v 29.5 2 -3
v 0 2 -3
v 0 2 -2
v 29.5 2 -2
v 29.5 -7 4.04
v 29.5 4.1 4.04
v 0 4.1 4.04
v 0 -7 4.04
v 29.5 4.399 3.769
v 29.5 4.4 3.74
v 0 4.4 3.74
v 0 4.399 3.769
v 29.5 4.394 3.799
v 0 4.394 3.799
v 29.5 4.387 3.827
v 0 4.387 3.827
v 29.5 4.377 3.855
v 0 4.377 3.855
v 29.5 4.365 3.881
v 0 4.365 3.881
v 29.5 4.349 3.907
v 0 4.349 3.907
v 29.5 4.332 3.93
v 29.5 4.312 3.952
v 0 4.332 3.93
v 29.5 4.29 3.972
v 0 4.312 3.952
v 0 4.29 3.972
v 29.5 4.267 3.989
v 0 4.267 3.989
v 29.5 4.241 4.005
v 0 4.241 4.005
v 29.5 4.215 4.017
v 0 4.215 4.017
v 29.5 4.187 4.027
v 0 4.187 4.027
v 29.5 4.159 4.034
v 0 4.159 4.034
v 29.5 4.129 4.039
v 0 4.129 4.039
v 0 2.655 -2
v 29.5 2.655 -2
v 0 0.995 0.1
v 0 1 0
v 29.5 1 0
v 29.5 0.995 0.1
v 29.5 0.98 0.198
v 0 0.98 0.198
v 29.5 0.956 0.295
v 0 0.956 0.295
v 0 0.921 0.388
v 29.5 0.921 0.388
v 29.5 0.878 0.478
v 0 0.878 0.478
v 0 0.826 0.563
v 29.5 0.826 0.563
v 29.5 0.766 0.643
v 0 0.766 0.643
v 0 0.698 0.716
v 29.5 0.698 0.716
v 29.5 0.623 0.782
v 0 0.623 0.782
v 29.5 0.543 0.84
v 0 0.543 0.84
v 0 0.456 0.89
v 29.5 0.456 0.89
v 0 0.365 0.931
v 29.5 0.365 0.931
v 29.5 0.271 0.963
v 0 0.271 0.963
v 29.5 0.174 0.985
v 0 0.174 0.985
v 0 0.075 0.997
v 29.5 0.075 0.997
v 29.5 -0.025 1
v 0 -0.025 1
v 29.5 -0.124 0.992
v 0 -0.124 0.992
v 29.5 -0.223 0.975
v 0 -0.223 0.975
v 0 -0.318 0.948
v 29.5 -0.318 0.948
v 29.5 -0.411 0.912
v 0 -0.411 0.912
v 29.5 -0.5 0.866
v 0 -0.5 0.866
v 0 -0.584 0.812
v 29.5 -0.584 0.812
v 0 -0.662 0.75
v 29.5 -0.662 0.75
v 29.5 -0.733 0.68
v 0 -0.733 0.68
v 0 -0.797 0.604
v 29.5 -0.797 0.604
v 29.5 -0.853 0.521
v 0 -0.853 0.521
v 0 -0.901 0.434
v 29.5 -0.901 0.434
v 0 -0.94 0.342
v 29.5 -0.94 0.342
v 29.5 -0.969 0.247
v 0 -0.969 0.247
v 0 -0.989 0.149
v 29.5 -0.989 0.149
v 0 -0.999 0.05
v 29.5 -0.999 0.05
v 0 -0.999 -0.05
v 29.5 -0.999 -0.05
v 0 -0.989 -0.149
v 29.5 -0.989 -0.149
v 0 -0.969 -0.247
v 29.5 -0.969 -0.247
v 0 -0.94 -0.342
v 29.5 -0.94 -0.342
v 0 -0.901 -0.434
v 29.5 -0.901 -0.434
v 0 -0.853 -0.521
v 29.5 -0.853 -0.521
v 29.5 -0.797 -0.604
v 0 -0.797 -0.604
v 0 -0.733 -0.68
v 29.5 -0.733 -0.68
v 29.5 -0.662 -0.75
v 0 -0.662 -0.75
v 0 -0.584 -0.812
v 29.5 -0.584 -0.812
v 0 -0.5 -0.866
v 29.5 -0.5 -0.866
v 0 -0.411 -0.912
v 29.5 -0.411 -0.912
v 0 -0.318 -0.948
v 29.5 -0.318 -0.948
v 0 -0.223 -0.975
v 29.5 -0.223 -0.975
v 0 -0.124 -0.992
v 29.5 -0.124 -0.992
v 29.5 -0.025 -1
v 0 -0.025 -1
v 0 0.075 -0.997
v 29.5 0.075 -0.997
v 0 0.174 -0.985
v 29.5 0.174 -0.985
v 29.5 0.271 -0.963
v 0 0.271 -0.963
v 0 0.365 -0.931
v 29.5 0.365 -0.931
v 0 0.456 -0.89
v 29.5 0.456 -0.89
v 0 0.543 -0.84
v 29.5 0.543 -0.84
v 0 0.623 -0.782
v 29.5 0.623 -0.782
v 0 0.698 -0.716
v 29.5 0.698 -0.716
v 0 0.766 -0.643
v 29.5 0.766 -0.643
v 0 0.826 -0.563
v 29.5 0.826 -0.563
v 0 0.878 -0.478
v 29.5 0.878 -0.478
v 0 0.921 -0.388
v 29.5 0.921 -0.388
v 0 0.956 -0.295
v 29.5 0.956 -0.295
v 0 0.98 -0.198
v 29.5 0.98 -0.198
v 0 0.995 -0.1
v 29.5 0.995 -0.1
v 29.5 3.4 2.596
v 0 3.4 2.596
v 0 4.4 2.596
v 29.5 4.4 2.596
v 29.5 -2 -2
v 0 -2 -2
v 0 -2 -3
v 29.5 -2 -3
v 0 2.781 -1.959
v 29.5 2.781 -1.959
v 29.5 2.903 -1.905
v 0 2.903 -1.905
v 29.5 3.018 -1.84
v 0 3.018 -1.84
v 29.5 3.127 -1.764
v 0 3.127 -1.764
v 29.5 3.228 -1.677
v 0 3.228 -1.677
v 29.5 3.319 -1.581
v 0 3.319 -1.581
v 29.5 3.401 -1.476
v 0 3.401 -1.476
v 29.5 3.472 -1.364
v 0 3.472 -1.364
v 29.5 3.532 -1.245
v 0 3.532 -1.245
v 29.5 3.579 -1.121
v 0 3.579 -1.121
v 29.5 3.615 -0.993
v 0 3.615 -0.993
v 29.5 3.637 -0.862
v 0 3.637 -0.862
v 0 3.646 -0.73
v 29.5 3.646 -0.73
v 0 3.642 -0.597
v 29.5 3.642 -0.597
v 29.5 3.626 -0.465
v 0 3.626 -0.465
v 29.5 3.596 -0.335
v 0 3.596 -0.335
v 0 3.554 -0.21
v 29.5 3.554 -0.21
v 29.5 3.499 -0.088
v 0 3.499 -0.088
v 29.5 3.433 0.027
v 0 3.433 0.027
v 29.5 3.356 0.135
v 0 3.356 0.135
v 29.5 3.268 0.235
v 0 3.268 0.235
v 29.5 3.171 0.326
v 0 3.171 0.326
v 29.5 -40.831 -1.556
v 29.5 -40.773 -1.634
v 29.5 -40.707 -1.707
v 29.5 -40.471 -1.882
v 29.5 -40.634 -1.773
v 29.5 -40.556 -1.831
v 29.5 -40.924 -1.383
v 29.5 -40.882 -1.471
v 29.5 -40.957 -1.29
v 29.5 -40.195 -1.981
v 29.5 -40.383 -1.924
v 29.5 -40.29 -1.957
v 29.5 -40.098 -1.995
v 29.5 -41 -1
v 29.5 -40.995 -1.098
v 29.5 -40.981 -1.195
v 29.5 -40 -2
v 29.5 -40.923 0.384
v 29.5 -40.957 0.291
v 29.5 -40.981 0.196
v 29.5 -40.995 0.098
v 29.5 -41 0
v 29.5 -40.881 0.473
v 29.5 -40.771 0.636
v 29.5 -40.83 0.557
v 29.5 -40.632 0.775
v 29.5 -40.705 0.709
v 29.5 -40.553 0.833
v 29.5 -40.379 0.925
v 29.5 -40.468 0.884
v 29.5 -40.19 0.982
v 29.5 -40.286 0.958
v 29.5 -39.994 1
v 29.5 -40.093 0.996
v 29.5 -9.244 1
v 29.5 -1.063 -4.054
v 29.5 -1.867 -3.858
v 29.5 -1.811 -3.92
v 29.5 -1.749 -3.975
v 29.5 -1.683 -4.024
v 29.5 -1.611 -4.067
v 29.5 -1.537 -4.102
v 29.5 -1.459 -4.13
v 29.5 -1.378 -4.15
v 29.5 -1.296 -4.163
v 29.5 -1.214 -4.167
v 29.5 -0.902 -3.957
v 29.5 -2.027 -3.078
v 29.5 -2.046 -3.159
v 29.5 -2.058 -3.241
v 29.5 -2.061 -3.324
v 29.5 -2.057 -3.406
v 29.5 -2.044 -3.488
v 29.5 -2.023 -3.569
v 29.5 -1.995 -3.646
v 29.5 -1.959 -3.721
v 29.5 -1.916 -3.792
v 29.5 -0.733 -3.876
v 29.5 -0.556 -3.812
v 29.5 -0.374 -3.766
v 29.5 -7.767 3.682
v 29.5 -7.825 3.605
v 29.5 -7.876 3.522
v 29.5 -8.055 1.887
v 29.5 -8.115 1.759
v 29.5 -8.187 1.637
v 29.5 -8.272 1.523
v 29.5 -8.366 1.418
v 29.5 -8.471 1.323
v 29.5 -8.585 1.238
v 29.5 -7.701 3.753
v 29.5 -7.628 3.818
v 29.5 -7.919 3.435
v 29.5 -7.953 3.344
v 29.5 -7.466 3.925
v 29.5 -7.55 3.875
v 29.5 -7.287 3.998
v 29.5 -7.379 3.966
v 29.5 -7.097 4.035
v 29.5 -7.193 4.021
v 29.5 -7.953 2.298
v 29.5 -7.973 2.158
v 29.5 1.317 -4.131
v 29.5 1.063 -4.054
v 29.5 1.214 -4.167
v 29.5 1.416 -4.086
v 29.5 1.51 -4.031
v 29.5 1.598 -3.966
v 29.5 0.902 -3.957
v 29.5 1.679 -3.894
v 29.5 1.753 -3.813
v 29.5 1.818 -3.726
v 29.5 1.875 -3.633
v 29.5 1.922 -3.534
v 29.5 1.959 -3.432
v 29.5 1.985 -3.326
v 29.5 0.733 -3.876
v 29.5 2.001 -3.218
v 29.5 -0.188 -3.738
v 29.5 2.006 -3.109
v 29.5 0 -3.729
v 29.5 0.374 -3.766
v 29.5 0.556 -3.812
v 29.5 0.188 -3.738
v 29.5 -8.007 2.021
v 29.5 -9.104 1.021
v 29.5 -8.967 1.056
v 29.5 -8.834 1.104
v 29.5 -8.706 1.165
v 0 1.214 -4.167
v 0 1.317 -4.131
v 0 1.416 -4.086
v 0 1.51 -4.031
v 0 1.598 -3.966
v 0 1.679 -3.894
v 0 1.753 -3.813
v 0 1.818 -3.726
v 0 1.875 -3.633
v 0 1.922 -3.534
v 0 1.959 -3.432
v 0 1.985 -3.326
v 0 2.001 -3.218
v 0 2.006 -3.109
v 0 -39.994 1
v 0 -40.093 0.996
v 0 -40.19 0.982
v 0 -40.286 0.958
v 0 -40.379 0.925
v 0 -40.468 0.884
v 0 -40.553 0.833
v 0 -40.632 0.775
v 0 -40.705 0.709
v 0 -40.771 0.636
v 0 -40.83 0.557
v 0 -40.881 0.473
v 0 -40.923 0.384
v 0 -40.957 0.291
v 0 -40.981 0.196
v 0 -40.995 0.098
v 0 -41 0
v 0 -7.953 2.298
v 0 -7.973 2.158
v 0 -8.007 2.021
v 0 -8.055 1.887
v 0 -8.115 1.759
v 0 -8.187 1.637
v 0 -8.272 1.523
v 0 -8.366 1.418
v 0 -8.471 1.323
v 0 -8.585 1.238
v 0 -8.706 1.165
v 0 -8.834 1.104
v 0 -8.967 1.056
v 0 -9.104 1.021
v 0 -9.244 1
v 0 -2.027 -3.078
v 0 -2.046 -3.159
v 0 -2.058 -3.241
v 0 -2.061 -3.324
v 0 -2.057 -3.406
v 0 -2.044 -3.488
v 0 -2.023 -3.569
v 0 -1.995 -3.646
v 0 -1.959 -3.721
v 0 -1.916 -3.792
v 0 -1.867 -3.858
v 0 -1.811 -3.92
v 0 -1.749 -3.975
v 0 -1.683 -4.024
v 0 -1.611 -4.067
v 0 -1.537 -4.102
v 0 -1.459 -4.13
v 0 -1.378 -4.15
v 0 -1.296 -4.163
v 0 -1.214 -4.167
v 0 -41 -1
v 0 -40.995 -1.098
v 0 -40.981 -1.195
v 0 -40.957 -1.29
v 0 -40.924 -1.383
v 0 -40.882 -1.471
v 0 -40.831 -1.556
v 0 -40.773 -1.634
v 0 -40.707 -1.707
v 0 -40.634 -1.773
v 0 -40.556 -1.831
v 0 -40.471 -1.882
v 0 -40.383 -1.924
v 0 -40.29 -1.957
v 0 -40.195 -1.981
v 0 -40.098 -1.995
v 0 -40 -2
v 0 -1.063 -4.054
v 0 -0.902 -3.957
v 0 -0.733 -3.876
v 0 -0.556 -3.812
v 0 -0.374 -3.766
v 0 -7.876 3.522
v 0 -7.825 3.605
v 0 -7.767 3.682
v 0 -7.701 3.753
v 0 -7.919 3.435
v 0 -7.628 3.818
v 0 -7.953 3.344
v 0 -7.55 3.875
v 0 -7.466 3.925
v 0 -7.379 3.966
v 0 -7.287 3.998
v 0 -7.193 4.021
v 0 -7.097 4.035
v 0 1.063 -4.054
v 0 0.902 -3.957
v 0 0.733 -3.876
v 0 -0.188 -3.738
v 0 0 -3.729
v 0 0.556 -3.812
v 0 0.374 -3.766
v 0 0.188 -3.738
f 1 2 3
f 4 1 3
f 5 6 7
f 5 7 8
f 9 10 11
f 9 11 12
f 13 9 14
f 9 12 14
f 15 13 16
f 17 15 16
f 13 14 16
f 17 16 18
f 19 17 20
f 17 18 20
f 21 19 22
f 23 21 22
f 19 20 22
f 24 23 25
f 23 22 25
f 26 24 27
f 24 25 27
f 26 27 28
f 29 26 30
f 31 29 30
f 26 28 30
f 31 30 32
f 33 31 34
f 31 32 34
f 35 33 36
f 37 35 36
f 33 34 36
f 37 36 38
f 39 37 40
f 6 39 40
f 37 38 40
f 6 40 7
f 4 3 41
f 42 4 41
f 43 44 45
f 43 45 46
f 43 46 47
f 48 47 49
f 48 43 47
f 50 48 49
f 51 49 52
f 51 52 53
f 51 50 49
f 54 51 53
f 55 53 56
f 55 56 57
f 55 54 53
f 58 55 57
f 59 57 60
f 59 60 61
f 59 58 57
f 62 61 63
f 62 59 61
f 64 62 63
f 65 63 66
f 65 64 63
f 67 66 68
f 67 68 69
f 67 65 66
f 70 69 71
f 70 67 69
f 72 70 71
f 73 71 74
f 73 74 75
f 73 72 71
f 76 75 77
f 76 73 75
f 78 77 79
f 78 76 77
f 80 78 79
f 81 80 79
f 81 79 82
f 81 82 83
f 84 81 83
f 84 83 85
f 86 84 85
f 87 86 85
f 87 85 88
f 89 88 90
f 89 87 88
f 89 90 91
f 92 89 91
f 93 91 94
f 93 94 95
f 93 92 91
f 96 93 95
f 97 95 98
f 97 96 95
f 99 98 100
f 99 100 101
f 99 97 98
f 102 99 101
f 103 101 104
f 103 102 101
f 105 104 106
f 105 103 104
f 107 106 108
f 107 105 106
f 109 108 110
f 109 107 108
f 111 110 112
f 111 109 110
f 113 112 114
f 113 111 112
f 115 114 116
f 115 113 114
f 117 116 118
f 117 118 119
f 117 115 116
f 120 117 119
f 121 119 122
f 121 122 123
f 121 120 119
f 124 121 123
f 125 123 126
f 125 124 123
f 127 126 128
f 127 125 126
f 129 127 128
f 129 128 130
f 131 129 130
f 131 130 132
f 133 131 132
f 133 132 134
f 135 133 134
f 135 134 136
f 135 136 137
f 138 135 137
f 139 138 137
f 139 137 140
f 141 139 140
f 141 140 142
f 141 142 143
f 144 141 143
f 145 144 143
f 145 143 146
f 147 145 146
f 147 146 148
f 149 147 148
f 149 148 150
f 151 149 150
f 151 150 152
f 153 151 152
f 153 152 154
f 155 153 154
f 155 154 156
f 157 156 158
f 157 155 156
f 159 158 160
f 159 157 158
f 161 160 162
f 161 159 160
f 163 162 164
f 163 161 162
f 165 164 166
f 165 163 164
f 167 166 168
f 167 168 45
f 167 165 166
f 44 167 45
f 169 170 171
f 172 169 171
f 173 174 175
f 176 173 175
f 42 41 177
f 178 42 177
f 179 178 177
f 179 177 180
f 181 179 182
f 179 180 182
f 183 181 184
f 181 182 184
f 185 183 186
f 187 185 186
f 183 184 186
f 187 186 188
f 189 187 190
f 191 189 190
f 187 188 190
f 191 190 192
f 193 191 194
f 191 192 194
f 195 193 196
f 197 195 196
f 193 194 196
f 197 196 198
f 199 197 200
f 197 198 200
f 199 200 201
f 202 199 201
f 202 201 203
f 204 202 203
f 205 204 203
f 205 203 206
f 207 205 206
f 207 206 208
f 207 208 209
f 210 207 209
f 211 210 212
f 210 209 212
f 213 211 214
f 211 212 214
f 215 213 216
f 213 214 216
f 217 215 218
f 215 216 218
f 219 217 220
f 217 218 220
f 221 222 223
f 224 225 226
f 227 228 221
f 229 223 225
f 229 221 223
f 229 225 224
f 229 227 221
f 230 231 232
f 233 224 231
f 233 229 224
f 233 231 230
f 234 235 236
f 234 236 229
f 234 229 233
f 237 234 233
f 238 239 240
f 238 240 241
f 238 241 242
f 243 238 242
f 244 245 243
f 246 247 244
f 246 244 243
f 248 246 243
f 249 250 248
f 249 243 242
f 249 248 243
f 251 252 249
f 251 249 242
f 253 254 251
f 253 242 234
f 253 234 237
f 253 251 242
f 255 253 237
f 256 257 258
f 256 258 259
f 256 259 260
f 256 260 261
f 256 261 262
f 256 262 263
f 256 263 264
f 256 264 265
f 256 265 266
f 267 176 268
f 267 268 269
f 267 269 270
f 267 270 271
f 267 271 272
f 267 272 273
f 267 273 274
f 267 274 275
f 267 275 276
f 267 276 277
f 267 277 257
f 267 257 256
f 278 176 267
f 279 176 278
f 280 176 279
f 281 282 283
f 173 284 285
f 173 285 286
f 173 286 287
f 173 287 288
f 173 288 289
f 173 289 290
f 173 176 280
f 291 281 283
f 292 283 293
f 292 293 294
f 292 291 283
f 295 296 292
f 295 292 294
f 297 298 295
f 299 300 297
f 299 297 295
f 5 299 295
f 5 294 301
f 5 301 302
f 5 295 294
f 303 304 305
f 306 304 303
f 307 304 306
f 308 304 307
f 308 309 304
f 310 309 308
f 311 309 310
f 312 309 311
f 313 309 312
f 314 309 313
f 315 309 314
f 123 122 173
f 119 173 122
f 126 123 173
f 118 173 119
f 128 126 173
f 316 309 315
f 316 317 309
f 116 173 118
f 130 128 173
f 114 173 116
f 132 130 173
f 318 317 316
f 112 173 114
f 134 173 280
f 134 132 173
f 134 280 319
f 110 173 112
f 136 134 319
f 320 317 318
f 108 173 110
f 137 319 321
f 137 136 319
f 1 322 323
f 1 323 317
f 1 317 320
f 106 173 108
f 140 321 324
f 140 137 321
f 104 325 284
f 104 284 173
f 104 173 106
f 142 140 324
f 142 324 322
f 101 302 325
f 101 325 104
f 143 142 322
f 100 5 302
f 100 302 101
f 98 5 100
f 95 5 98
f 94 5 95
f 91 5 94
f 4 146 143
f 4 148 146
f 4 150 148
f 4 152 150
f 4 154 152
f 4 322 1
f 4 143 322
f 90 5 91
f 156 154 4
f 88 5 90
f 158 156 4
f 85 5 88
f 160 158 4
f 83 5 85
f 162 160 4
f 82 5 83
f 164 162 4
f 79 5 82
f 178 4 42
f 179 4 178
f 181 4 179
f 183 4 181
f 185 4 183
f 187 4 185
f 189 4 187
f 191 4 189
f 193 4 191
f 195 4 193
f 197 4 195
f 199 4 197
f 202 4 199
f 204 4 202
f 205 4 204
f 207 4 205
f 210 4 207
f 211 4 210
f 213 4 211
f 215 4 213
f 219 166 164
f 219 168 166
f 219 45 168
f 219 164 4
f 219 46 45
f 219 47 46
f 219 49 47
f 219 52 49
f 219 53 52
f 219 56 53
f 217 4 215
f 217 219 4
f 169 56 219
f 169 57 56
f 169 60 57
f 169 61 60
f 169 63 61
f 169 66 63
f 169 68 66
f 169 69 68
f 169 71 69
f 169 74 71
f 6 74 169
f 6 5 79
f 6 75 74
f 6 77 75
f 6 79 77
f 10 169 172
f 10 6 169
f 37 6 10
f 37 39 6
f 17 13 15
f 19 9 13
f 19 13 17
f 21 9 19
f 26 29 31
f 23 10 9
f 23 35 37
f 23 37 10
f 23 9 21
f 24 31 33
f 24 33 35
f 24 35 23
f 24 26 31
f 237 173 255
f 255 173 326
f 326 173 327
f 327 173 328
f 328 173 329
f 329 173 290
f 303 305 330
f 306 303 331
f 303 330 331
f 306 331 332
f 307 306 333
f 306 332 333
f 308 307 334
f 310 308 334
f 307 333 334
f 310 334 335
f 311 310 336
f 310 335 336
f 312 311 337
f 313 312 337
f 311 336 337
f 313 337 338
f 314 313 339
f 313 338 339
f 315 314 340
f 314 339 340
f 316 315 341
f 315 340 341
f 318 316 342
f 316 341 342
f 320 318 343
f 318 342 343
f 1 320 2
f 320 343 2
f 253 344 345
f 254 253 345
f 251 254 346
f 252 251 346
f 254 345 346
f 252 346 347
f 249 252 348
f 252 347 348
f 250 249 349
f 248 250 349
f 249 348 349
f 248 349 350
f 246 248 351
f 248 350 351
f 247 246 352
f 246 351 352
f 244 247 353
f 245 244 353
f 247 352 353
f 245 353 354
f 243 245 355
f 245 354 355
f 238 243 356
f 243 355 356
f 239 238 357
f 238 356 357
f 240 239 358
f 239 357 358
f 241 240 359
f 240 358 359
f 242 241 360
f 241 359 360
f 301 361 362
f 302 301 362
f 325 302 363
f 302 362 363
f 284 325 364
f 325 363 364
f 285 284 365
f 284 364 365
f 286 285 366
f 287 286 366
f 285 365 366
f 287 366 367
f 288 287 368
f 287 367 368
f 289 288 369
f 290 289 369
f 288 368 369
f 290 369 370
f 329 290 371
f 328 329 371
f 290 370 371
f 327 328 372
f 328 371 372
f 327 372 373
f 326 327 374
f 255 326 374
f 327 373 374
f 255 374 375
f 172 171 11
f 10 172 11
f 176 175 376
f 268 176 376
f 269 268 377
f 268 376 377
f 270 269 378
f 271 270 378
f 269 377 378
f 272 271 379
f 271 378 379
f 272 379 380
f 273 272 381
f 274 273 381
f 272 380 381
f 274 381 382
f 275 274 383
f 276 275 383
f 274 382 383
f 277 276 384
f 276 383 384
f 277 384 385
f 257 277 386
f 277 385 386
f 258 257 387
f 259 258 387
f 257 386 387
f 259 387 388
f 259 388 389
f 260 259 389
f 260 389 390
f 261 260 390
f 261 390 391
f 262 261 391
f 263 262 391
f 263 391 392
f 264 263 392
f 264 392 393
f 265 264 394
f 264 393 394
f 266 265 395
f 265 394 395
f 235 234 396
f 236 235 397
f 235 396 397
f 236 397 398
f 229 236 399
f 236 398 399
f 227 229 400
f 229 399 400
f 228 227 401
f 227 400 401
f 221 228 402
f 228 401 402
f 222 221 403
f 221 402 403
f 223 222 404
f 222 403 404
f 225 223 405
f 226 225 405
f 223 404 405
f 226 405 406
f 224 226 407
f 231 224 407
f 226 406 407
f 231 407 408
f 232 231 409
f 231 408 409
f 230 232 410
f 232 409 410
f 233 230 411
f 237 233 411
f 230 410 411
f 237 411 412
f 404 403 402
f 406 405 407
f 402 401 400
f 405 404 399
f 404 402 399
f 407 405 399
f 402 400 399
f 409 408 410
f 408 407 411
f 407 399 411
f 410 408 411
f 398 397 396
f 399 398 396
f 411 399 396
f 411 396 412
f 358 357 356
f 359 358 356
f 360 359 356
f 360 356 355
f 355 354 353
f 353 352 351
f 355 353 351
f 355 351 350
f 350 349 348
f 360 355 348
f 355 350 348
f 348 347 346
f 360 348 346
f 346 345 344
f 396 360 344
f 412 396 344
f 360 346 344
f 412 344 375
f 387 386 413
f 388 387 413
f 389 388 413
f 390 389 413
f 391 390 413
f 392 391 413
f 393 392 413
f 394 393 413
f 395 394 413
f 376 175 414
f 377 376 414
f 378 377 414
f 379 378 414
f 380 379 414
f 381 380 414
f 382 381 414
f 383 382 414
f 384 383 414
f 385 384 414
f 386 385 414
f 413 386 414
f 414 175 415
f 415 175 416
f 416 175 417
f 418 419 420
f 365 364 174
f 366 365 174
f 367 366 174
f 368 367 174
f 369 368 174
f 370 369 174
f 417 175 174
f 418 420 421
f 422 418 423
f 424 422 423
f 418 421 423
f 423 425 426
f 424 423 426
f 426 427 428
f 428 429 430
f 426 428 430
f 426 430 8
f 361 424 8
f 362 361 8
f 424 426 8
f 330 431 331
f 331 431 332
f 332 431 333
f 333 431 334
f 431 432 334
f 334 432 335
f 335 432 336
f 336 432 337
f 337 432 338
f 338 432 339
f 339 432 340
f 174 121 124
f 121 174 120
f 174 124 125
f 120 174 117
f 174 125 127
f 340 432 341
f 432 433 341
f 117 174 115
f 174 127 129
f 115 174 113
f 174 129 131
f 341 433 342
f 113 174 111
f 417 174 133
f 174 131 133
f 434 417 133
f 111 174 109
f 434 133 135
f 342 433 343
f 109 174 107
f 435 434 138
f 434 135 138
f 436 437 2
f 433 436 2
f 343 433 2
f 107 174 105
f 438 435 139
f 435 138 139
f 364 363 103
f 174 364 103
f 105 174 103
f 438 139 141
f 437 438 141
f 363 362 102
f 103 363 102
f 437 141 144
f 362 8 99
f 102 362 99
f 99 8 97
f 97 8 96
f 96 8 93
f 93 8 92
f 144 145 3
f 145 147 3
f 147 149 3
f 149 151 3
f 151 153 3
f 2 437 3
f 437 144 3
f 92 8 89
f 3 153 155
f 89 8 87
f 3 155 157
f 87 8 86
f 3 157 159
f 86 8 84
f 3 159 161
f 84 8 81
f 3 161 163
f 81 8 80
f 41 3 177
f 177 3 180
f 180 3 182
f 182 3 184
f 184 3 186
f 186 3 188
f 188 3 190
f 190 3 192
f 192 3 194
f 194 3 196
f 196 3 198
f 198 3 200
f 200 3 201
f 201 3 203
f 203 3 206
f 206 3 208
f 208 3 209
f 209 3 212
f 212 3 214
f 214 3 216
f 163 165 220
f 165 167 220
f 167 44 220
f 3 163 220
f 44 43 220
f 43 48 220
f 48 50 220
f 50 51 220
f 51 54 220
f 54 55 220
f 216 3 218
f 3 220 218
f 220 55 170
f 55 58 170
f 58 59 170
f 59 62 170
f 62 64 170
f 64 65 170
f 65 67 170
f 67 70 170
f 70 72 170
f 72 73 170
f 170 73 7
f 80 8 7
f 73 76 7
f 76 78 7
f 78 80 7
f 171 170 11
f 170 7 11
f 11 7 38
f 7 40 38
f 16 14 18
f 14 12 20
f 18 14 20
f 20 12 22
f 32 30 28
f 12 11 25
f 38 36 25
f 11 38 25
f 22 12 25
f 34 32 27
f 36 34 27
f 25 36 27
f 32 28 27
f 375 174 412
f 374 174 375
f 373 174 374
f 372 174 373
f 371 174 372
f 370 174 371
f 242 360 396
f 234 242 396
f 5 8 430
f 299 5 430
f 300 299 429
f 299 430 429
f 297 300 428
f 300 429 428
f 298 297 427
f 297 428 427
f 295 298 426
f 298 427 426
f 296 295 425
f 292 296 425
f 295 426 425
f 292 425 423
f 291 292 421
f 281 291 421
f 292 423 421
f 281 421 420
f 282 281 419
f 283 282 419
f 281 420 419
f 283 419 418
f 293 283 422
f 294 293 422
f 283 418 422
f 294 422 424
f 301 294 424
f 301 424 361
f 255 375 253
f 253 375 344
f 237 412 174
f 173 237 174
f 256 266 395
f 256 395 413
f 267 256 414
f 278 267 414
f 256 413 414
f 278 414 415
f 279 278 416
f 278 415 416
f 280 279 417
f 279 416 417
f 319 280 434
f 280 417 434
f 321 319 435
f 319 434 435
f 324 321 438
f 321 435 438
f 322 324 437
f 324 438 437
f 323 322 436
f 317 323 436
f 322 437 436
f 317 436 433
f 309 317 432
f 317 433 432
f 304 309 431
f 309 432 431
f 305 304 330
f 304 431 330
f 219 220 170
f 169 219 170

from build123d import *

# Parameters (mm, degrees)
SKETCH_R  = 1
PAD_DEPTH = 29.5


with BuildPart() as part:
    # Sketch → Pad (new body)
    with BuildSketch(Plane.YZ):
        with BuildLine():
            ThreePointArc((-39.994398, 0.999984), (-40.705123, 0.709085), (-41, 0))
            Line((-41, 0), (-41, -1))
            ThreePointArc((-41, -1), (-40.707107, -1.707107), (-40, -2))
            Line((-40, -2), (-2, -2))
            Line((-2, -2), (-2, -3))
            ThreePointArc((-2, -3), (-1.91611, -3.791945), (-1.213507, -4.166863))
            ThreePointArc((-1.213507, -4.166863), (0, -3.728848), (1.213507, -4.166863))
            ThreePointArc((1.213507, -4.166863), (1.818438, -3.726112), (2, -3))
            Line((2, -3), (2, -2))
            Line((2, -2), (2.654702, -2))
            ThreePointArc((2.654702, -2), (3.614511, -0.992973), (3.171248, 0.325684))
            Line((3.171248, 0.325684), (3.4, 2.595785))
            Line((3.4, 2.595785), (4.4, 2.595785))
            Line((4.4, 2.595785), (4.4, 3.74))
            ThreePointArc((4.4, 3.74), (4.312132, 3.952132), (4.1, 4.04))
            Line((4.1, 4.04), (-7, 4.04))
            ThreePointArc((-7, 4.04), (-7.58987, 3.847498), (-7.952638, 3.344107))
            Line((-7.952638, 3.344107), (-7.952638, 2.298428))
            ThreePointArc((-7.952638, 2.298428), (-8.36641, 1.418293), (-9.244398, 0.999984))
            Line((-9.244398, 0.999984), (-39.994398, 0.999984))
        make_face()
        Circle(SKETCH_R, mode=Mode.SUBTRACT)
    extrude(amount=PAD_DEPTH)


solid = part.part
